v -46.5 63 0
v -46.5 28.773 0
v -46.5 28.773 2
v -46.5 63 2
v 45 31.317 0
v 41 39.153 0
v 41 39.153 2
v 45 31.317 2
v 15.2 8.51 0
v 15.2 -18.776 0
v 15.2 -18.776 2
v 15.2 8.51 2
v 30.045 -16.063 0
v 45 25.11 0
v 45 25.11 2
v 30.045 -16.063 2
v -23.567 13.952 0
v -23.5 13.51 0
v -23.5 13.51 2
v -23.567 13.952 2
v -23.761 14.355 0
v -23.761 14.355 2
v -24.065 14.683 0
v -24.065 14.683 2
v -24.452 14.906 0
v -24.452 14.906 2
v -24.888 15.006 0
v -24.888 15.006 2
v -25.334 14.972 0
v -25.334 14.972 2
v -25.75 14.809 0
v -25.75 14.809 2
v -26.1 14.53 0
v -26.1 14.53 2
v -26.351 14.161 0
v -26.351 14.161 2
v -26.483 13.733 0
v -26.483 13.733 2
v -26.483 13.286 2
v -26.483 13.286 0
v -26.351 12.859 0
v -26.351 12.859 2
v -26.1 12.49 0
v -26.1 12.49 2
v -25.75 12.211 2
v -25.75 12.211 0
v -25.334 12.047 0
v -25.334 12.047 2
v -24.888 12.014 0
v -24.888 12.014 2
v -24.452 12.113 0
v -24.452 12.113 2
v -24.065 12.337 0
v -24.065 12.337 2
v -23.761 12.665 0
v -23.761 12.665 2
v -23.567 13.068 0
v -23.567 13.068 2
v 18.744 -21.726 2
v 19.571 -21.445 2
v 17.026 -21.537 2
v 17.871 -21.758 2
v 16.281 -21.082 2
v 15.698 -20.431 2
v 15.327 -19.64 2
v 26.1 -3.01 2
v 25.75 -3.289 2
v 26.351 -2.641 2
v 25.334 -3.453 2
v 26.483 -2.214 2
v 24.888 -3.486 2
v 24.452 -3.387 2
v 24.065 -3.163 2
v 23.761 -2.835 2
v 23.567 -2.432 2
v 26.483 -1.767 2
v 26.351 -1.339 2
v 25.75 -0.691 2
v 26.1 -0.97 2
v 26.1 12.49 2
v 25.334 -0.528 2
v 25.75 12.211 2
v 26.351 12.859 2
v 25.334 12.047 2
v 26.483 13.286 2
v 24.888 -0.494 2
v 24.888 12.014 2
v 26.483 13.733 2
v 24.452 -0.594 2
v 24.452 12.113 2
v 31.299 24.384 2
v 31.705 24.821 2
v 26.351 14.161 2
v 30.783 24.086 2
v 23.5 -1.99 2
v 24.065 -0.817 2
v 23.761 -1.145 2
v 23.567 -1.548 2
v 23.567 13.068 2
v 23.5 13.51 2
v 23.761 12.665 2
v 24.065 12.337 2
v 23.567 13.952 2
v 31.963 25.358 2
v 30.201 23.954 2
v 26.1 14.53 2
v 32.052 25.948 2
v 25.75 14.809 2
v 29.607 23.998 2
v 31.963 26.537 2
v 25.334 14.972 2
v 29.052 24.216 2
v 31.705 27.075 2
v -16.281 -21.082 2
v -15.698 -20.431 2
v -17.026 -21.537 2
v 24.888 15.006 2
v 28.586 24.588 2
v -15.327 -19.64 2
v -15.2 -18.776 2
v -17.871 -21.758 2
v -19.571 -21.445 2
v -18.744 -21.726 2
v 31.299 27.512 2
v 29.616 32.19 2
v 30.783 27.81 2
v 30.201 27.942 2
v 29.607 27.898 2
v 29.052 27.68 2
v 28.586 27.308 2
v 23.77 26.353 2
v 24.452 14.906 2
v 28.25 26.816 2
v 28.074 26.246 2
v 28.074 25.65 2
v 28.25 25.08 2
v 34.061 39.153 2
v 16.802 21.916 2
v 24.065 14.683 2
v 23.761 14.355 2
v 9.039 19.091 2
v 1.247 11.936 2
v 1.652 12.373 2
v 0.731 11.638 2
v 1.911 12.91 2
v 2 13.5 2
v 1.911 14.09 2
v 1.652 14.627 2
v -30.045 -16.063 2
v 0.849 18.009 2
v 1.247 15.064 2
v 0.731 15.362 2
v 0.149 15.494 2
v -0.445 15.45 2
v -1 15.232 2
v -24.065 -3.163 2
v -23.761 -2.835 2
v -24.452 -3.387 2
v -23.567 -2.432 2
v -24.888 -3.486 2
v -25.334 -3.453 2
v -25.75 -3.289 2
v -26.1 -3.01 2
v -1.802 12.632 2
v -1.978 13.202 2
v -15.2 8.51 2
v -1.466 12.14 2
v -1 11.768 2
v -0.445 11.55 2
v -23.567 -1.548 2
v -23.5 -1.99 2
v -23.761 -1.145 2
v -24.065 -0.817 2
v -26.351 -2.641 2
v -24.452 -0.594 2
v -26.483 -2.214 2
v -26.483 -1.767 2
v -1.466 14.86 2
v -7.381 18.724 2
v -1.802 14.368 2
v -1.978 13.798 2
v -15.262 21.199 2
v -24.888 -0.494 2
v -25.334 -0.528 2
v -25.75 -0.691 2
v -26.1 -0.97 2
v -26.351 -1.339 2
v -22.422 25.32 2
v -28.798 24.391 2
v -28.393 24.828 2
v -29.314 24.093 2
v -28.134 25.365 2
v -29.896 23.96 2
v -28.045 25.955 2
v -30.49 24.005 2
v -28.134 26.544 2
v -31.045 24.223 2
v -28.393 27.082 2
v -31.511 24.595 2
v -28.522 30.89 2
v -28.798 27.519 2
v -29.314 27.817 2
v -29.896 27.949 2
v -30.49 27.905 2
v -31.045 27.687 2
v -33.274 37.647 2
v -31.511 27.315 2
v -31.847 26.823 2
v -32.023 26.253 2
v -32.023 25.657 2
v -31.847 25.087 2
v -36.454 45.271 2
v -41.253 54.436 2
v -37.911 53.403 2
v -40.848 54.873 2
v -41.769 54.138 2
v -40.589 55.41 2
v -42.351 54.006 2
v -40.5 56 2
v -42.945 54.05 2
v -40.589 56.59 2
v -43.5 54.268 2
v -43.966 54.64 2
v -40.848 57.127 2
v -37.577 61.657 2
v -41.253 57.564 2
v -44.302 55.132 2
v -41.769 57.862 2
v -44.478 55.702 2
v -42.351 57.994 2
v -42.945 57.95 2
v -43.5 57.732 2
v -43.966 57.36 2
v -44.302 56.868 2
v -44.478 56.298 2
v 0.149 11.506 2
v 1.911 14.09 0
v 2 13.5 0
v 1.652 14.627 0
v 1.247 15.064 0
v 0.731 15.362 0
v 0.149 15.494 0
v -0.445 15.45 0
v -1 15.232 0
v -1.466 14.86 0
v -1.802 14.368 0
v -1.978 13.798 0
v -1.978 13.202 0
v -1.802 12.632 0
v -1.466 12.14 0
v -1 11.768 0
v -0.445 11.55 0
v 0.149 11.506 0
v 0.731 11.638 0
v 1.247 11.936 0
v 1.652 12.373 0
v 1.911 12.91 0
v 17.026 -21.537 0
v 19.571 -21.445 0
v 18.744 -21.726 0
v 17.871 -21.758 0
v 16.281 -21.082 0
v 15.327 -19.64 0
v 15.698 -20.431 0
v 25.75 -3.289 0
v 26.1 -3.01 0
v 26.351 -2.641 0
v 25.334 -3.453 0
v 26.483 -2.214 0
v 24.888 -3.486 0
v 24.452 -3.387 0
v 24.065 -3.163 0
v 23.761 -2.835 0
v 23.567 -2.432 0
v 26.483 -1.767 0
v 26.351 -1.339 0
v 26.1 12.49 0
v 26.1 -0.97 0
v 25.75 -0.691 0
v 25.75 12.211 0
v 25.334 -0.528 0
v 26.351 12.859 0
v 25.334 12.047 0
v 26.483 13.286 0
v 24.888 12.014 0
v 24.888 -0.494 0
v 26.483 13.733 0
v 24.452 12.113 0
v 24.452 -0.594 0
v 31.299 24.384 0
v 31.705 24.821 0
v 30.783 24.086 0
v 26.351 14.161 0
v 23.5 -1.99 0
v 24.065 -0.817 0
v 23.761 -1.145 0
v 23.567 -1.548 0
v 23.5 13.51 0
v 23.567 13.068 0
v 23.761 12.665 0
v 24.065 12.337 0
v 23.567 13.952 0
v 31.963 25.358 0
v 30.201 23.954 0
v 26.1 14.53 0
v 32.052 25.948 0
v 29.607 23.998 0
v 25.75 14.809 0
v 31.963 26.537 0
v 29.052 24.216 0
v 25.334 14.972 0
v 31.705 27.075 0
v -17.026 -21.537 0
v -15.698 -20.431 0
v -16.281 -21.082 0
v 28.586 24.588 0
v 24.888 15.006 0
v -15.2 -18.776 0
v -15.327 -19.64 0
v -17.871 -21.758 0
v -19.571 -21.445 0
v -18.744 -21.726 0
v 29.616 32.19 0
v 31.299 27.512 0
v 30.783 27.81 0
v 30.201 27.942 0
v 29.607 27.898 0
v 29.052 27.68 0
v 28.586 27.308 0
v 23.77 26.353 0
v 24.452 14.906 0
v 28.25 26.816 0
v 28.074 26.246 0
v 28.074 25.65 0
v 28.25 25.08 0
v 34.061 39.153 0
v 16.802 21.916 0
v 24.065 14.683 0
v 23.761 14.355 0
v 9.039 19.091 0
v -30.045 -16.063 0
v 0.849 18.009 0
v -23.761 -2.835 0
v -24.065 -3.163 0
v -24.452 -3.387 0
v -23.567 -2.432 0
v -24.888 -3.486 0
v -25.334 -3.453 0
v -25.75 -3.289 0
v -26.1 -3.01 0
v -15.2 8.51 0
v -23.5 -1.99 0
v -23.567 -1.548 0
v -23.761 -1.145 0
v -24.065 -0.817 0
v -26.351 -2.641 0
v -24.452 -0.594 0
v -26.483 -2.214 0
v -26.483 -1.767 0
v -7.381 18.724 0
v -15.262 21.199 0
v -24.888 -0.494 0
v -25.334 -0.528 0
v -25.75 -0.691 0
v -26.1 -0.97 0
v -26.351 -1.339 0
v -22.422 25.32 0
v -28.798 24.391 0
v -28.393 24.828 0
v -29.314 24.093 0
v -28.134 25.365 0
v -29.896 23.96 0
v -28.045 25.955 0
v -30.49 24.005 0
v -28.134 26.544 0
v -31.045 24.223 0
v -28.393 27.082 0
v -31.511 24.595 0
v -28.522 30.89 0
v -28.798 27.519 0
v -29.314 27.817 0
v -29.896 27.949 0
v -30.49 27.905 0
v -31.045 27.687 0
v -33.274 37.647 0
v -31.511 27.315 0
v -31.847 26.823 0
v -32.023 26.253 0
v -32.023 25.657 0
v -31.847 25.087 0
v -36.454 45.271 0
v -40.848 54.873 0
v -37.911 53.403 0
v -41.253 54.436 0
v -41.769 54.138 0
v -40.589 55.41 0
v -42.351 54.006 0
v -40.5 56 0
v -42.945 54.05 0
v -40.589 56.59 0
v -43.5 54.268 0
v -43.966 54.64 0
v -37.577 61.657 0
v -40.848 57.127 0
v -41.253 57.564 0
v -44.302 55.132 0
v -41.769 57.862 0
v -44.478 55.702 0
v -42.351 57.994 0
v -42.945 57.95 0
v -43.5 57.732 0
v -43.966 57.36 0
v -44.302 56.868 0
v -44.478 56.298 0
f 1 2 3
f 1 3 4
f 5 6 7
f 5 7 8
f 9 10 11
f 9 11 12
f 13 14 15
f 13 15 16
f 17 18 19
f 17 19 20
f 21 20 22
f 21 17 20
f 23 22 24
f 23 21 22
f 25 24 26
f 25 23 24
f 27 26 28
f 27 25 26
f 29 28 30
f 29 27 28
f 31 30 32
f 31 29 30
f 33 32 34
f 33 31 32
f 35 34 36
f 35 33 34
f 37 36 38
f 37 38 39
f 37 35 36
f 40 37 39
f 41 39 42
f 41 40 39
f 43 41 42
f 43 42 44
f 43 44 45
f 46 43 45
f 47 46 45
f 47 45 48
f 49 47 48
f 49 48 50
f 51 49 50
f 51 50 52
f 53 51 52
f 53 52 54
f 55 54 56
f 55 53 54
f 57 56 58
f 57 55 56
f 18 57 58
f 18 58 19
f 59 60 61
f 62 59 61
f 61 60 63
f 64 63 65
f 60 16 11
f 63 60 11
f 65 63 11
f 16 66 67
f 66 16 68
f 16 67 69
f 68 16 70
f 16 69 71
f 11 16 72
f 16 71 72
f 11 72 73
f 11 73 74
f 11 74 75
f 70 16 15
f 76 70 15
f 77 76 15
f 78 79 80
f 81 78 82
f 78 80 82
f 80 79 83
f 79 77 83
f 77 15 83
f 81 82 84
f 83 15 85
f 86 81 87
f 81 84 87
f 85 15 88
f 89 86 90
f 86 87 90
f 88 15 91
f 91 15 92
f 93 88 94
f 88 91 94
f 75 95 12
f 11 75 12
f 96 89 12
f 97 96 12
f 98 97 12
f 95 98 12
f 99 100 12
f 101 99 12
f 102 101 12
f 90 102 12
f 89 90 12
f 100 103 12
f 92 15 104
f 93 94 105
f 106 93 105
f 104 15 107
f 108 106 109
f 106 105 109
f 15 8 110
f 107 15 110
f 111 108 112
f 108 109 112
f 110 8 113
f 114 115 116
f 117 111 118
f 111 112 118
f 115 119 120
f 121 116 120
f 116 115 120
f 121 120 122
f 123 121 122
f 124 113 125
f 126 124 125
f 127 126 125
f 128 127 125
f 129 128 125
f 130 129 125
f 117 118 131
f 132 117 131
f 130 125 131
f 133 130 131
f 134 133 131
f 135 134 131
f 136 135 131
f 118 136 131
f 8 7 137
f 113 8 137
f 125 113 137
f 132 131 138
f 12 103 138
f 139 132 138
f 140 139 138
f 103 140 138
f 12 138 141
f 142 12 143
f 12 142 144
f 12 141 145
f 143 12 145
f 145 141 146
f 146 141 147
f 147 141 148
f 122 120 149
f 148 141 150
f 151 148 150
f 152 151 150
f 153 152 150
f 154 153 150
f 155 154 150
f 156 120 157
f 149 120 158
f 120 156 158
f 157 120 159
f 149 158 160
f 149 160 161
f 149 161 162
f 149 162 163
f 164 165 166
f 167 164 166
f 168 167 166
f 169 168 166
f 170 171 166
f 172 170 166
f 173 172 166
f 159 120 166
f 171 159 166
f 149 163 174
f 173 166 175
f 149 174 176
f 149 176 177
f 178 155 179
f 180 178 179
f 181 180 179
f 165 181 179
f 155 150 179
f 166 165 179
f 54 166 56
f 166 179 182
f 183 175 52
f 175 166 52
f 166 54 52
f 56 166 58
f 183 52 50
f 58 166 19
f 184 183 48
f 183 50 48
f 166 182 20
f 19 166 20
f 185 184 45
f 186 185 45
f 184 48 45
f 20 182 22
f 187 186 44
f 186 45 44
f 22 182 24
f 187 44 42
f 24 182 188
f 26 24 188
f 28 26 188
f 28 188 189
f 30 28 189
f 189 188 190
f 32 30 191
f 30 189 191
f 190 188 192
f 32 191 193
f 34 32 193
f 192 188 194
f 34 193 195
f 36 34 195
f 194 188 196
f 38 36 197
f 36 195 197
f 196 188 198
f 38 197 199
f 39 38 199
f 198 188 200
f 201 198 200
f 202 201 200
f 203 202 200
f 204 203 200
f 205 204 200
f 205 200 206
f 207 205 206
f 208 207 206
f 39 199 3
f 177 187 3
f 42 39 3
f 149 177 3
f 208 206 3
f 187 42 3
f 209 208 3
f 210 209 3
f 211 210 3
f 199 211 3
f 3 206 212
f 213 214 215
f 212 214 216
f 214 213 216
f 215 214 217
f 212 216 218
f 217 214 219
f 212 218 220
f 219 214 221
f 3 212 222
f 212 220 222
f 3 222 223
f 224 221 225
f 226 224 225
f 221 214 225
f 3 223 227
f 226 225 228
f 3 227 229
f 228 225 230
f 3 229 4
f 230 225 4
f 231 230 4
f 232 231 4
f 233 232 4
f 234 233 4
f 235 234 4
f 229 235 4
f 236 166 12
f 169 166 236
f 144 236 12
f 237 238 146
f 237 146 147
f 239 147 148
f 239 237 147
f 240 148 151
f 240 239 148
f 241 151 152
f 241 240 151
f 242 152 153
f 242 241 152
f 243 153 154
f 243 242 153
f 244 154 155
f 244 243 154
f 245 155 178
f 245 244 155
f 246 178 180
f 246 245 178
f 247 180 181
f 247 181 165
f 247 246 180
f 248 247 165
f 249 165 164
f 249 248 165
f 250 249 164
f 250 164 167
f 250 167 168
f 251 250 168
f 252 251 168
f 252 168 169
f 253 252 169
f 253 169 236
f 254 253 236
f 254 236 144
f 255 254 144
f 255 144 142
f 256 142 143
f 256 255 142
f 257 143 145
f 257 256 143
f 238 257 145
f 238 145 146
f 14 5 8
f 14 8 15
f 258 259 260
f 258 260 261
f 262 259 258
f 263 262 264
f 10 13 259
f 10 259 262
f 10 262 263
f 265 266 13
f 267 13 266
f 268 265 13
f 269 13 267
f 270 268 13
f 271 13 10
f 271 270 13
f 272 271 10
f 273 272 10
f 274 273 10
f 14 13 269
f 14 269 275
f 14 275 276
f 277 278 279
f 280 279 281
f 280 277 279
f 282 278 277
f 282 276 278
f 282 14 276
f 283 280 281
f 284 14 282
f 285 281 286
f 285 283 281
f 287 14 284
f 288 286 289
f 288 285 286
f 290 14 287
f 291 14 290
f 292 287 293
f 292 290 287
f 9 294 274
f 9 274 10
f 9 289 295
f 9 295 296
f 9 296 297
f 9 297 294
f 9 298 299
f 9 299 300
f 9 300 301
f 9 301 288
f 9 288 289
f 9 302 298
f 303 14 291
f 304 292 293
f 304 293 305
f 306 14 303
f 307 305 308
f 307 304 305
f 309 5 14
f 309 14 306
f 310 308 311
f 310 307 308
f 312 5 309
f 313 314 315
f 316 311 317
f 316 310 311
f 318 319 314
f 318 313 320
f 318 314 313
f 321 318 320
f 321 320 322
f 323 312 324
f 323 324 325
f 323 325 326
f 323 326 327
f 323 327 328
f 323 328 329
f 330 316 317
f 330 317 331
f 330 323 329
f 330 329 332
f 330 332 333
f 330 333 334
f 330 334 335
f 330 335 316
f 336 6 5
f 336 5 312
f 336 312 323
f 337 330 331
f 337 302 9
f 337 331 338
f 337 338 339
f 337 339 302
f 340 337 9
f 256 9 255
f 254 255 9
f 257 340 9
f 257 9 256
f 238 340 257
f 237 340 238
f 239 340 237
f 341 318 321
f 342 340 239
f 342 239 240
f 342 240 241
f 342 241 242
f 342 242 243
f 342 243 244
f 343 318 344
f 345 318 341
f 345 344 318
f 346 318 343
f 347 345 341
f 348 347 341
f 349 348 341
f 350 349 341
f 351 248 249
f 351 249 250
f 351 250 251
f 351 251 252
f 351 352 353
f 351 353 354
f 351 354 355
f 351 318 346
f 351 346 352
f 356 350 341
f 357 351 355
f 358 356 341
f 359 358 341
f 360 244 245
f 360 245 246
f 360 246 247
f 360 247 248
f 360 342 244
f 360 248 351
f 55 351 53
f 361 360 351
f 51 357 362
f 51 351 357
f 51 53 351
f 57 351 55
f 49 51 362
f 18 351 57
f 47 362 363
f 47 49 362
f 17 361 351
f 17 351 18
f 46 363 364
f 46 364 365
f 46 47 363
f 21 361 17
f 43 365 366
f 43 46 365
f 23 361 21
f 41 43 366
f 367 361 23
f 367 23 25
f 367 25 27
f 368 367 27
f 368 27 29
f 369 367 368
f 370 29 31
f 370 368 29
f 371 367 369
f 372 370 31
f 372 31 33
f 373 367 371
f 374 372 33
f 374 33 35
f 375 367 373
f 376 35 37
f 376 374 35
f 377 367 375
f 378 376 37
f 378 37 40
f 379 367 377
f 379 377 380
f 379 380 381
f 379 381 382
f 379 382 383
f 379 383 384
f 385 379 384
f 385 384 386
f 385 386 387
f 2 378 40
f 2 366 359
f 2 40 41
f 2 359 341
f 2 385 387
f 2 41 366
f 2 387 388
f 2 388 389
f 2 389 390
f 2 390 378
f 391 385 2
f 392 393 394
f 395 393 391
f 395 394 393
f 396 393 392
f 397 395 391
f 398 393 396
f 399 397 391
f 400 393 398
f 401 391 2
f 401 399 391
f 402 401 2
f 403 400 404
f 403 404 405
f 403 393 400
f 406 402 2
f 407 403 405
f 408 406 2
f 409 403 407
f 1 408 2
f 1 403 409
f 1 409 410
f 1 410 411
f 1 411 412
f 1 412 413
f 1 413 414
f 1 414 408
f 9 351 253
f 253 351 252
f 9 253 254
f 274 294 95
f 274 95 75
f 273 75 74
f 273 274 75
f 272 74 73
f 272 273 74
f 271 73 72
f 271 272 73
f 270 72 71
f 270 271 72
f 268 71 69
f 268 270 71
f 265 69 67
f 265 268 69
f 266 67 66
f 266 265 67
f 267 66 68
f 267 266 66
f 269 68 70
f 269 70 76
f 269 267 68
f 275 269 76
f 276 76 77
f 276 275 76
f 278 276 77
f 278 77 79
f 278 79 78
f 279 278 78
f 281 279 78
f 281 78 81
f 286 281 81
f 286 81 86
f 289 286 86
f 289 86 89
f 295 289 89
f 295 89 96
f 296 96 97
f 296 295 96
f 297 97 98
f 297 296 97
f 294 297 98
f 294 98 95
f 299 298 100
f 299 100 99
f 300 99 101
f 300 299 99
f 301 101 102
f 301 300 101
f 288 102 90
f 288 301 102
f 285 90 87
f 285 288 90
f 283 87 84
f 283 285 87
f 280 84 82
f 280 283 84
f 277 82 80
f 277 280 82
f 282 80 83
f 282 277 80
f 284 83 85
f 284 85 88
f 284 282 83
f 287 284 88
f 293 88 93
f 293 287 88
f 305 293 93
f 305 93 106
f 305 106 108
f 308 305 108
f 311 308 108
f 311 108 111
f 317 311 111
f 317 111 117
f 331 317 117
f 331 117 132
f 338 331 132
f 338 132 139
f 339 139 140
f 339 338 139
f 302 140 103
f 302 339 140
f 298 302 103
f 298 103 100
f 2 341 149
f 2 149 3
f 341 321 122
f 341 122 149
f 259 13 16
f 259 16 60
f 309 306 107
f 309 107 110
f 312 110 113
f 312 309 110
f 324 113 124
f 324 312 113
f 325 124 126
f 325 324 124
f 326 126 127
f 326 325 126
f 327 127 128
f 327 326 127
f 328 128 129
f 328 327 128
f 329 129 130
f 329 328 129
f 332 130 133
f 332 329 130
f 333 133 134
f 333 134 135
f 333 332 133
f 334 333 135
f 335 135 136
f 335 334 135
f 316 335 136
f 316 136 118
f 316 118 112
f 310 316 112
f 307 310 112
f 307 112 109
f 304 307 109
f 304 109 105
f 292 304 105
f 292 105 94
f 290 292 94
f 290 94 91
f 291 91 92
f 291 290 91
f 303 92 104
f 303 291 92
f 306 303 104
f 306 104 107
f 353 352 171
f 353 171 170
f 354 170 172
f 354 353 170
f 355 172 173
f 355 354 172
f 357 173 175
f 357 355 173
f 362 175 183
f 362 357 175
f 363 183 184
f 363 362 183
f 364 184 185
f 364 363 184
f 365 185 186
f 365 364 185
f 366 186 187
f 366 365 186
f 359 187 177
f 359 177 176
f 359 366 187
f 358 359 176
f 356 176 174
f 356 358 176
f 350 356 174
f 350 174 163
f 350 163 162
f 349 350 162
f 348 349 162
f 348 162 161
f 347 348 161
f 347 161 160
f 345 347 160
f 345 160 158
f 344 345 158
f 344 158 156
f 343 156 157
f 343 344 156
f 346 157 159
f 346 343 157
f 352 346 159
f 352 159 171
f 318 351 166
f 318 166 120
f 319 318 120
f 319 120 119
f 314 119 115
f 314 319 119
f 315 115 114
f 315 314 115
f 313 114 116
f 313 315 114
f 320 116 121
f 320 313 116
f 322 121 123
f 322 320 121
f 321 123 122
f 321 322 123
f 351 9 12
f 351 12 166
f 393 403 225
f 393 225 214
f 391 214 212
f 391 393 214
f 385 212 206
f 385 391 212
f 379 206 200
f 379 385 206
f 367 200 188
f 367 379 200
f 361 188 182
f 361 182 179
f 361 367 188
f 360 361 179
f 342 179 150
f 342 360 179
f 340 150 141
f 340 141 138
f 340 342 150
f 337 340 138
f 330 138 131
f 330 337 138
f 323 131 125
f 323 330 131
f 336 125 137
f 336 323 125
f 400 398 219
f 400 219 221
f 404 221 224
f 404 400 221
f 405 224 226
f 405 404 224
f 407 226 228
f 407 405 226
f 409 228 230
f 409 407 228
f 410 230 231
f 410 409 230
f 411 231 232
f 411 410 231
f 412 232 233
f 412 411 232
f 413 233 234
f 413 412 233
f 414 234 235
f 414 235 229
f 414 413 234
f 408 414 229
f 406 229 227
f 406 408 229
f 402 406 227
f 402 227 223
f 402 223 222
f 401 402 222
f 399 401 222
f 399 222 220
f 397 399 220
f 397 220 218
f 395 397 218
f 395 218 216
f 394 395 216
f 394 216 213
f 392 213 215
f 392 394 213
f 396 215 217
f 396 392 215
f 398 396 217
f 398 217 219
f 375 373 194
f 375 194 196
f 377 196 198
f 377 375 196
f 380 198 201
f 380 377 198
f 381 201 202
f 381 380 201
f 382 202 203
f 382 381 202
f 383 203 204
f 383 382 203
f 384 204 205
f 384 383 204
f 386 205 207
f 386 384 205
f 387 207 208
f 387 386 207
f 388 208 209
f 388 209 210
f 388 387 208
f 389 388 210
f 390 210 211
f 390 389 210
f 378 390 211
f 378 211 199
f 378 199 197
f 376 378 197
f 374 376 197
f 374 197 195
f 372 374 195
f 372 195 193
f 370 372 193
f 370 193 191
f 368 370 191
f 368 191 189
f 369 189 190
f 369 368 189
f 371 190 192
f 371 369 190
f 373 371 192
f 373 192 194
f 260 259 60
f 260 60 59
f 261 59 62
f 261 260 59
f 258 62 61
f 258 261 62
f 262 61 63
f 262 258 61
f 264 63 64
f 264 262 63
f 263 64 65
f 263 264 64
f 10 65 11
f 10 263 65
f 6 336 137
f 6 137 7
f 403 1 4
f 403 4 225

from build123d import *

# Parameters (mm, degrees)
SKETCH_3_R      = 2
SKETCH_3_R_2    = 1.5
EXTRUDE_1_DEPTH = 2


with BuildPart() as part:
    # 草图3 → 凸台-拉伸1 (new body)
    with BuildSketch(Plane.XY):
        with BuildLine():
            Line((-46.5, 63), (-37.576612526, 61.656694359))
            ThreePointArc((-37.576612526, 61.656694359), (-11.38853896, 19.746708007), (34.06116735, 39.152540881))
            Line((34.06116735, 39.152540881), (41, 39.152540881))
            Line((41, 39.152540881), (45, 31.317051182))
            Line((45, 31.317051182), (45, 25.109783315))
            Line((45, 25.109783315), (30.045120352, -16.062768097))
            Line((30.045120352, -16.062768097), (19.571056376, -21.44452782))
            ThreePointArc((19.571056376, -21.44452782), (16.636857193, -21.33673956), (15.2, -18.776156704))
            Line((15.2, -18.776156704), (15.2, 8.509783315))
            Line((15.2, 8.509783315), (0, 8.509783315))
            Line((0, 8.509783315), (-15.2, 8.509783315))
            Line((-15.2, 8.509783315), (-15.2, -18.776156704))
            ThreePointArc((-15.2, -18.776156704), (-16.636857193, -21.33673956), (-19.571056376, -21.44452782))
            Line((-19.571056376, -21.44452782), (-30.045120352, -16.062768097))
            Line((-30.045120352, -16.062768097), (-46.5, 28.773494756))
            Line((-46.5, 28.773494756), (-46.5, 63))
        make_face()
        with Locations((0, 13.5)):
            Circle(SKETCH_3_R, mode=Mode.SUBTRACT)
        with Locations((-42.5, 56)):
            Circle(SKETCH_3_R, mode=Mode.SUBTRACT)
        with Locations((30.0520382, 25.9479618)):
            Circle(SKETCH_3_R, mode=Mode.SUBTRACT)
        with Locations((-30.045120352, 25.954879648)):
            Circle(SKETCH_3_R, mode=Mode.SUBTRACT)
        with Locations((-25, -1.990216685)):
            Circle(SKETCH_3_R_2, mode=Mode.SUBTRACT)
        with Locations((-25, 13.509783315)):
            Circle(SKETCH_3_R_2, mode=Mode.SUBTRACT)
        with Locations(Location((25, 13.509783315, 0), (0, 0, 180))):
            Circle(SKETCH_3_R_2, mode=Mode.SUBTRACT)
        with Locations(Location((25, -1.990216685, 0), (0, 0, 180))):
            Circle(SKETCH_3_R_2, mode=Mode.SUBTRACT)
    extrude(amount=EXTRUDE_1_DEPTH)


solid = part.part
